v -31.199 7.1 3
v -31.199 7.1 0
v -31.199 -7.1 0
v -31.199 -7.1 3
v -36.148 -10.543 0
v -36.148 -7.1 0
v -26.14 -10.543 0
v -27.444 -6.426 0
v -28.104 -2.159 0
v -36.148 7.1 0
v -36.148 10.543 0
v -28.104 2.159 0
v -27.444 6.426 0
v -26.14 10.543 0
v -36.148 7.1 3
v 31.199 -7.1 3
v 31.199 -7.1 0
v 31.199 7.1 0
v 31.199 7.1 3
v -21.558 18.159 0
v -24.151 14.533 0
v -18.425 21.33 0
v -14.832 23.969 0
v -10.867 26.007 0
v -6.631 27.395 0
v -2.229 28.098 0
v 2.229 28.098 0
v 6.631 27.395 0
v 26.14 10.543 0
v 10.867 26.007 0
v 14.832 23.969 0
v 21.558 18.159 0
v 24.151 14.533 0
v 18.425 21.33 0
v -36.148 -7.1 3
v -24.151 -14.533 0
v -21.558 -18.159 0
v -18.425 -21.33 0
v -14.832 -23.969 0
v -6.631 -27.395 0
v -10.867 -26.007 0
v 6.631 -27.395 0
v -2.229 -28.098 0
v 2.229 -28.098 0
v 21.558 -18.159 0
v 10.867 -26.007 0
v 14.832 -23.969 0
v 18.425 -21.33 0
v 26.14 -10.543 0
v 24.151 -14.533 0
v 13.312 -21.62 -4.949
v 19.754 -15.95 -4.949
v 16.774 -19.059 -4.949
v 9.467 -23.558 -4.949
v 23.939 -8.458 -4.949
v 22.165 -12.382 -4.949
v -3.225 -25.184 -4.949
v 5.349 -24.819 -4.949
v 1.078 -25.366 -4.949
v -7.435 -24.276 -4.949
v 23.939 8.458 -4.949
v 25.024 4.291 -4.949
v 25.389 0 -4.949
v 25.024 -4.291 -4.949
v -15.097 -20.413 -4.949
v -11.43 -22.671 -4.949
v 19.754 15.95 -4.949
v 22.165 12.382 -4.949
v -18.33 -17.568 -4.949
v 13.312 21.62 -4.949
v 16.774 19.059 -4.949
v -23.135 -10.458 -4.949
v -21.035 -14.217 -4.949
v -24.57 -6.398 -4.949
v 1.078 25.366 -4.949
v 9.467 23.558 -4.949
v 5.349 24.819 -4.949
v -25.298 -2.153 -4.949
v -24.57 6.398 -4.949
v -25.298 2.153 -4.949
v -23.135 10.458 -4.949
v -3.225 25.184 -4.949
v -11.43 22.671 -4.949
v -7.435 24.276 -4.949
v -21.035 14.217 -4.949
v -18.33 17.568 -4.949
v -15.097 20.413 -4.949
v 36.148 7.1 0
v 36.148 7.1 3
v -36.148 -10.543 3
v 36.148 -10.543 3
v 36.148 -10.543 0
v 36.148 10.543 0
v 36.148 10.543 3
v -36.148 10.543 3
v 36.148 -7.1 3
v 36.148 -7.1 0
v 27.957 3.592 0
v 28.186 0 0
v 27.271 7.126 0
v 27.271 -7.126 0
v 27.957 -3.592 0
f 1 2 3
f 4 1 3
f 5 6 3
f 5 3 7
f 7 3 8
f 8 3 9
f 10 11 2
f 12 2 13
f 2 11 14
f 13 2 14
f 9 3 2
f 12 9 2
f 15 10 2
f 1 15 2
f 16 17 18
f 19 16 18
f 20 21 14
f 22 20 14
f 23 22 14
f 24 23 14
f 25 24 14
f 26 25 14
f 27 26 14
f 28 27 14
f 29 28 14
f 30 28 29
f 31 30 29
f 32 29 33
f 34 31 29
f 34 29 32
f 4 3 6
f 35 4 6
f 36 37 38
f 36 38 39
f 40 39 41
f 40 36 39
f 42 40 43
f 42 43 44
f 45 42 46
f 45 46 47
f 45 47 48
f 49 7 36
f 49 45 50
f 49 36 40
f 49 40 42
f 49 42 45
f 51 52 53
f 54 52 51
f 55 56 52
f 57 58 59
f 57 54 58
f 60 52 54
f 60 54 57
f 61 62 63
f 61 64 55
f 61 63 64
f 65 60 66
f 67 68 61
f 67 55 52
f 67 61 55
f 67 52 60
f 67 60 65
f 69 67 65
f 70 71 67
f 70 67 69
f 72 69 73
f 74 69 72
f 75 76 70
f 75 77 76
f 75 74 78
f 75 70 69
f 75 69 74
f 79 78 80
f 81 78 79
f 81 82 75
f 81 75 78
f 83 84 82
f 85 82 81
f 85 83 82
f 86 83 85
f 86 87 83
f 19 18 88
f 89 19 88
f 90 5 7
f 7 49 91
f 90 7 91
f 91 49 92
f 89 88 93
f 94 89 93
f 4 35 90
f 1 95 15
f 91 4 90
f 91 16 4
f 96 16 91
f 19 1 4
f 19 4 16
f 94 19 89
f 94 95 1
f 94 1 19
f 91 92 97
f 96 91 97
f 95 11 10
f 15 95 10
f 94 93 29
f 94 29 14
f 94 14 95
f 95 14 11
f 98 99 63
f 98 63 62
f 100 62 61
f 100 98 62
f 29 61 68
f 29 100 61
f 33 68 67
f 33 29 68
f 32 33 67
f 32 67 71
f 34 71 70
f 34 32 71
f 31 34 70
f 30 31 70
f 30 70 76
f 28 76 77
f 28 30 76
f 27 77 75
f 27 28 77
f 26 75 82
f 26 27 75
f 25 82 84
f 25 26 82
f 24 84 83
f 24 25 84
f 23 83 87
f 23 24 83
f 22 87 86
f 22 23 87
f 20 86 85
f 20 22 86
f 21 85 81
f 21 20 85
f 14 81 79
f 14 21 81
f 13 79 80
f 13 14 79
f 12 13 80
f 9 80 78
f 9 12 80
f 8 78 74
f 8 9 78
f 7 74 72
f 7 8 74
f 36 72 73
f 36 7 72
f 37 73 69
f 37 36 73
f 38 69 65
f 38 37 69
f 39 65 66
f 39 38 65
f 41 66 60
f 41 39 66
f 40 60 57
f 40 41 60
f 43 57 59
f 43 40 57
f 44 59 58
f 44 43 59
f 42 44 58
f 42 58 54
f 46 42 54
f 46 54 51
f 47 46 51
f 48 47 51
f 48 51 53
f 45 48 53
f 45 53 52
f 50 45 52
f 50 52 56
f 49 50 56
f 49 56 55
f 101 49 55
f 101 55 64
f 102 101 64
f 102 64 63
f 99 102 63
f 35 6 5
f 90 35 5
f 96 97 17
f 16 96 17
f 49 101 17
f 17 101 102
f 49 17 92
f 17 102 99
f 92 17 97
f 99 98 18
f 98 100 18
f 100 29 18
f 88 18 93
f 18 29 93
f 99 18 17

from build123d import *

# Parameters (mm, degrees)
F3_DEPTH = 3


with BuildPart() as f1:
    # F0 (on Front) → F1 (revolve)
    with BuildSketch(Plane.XZ):
        Polygon((28.186478, 0), (0, 0), (0, -4.948771), (25.389344, -4.948771), align=None)
    revolve(axis=Axis((0, 0, -2.474385), (0, 0, 1)))

    # F2 (on Top) → F3 (join)
    with BuildSketch(Plane.XY):
        Polygon((-36.147542, -7.10041), (-36.147542, -10.543033), (0, -10.543033), (36.147542, -10.543033), (36.147542, -7.10041), (31.198772, -7.10041), (31.198772, 0), (31.198772, 7.10041), (36.147542, 7.10041), (36.147542, 10.543033), (0, 10.543033), (-36.147542, 10.543033), (-36.147542, 7.10041), (-31.198772, 7.10041), (-31.198772, 0), (-31.198772, -7.10041), align=None)
    extrude(amount=F3_DEPTH)


solid = f1.part
